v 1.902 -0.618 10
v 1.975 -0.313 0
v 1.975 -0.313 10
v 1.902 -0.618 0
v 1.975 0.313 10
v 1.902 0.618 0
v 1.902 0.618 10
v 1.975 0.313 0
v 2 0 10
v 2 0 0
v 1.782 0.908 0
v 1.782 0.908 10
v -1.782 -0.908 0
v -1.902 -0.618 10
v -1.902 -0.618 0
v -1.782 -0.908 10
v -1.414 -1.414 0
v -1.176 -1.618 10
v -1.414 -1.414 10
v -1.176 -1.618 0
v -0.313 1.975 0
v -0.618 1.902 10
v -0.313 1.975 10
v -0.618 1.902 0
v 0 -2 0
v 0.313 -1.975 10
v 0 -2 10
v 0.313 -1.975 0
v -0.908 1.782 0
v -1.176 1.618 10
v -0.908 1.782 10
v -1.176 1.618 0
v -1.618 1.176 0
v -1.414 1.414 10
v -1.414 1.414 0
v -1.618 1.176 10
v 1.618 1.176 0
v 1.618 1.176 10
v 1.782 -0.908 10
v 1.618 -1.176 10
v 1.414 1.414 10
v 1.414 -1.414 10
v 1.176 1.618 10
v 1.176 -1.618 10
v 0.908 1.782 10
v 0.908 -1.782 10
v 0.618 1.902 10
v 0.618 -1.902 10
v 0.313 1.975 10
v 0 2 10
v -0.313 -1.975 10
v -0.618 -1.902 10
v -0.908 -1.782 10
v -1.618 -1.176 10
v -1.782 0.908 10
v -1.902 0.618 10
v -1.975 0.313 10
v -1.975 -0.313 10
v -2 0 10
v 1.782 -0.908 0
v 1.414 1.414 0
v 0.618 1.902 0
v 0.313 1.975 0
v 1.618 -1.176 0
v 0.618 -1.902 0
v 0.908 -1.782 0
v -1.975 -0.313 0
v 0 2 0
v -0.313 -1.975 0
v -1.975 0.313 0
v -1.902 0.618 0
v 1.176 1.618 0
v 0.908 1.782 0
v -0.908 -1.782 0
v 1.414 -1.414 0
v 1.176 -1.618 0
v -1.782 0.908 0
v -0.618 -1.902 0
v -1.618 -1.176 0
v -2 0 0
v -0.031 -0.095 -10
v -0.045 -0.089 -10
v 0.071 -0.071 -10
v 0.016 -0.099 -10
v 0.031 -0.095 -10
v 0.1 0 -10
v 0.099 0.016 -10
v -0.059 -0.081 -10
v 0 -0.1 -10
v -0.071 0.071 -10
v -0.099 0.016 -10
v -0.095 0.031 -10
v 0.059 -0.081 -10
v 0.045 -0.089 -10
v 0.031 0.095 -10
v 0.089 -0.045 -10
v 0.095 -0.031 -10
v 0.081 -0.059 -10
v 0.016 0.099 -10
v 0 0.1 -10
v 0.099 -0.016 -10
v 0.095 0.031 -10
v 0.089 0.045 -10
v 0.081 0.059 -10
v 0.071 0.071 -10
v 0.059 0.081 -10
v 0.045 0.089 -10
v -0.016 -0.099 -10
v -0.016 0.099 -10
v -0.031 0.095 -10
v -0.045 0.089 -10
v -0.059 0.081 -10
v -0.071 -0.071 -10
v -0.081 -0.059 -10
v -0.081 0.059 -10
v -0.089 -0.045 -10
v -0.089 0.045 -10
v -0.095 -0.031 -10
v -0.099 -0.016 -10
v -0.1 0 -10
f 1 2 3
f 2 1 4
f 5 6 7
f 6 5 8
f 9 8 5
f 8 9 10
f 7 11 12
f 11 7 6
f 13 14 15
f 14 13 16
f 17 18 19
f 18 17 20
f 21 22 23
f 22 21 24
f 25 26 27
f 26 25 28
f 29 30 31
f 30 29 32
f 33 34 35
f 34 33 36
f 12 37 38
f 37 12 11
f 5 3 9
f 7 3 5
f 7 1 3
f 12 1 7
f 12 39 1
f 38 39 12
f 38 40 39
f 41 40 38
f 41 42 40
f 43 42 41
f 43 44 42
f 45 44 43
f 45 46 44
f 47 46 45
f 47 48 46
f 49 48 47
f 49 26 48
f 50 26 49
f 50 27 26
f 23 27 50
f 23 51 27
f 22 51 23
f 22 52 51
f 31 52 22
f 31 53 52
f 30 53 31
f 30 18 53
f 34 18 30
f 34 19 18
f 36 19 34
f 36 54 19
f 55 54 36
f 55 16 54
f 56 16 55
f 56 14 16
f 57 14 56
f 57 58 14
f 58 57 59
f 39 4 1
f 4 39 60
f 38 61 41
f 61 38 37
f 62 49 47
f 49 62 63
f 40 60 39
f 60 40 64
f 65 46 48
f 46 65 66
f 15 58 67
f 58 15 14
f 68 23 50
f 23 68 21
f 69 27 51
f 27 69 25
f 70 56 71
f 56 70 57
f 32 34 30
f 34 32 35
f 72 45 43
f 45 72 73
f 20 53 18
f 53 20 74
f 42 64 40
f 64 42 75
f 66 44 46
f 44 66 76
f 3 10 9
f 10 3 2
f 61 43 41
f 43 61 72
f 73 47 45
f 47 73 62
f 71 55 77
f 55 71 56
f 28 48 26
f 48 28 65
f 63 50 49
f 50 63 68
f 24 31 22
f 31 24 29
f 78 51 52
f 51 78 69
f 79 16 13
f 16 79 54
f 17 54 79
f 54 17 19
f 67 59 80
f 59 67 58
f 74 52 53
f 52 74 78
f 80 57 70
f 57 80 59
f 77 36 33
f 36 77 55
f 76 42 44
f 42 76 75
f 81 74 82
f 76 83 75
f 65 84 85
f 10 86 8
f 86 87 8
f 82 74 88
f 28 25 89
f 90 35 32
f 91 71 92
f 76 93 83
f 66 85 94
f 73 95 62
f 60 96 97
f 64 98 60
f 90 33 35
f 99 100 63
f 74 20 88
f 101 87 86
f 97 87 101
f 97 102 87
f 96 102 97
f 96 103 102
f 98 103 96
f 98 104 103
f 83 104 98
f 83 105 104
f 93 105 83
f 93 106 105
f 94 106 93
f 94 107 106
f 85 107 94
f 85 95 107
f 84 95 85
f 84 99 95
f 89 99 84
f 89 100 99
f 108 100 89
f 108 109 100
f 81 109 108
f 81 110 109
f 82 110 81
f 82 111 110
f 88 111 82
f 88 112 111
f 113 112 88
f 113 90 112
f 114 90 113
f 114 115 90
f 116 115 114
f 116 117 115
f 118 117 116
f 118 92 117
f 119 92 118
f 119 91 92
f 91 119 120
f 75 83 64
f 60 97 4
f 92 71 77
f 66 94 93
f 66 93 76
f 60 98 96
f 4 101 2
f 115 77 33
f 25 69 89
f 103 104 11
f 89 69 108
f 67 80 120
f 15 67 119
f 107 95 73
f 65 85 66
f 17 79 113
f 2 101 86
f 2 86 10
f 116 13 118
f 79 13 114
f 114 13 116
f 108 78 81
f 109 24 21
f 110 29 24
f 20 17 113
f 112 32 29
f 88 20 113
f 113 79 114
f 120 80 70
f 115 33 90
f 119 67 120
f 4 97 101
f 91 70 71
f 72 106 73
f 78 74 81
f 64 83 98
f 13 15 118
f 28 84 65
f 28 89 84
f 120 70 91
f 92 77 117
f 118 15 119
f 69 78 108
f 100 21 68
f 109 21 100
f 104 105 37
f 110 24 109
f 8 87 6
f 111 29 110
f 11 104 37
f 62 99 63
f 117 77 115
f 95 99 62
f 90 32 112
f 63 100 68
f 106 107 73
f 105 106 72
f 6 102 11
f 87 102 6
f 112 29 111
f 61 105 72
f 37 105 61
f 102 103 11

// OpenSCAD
//disc();
pin();

module disc() {
	difference() {
		union() {
			for (i = [0:20:360]) {
				rotate(a=i, v=[0,0,1]) {
					cube([2,10,2]);
					translate([6,6,0]) {
						cube([10,10,2]);
					}
				}
			}
			for (i = [0:60:360]) {
				rotate(a=i, v=[0,0,1]) {
					cube([1,10,2]);
				}
			}
		}
	pin();
	}
}

module pin() {
	cylinder(h=10,r=2,$fn=40);
	translate([0,0,-10]) {
		cylinder(h=10,r1=0.1,r2=2,$fn=40);
	}
}
